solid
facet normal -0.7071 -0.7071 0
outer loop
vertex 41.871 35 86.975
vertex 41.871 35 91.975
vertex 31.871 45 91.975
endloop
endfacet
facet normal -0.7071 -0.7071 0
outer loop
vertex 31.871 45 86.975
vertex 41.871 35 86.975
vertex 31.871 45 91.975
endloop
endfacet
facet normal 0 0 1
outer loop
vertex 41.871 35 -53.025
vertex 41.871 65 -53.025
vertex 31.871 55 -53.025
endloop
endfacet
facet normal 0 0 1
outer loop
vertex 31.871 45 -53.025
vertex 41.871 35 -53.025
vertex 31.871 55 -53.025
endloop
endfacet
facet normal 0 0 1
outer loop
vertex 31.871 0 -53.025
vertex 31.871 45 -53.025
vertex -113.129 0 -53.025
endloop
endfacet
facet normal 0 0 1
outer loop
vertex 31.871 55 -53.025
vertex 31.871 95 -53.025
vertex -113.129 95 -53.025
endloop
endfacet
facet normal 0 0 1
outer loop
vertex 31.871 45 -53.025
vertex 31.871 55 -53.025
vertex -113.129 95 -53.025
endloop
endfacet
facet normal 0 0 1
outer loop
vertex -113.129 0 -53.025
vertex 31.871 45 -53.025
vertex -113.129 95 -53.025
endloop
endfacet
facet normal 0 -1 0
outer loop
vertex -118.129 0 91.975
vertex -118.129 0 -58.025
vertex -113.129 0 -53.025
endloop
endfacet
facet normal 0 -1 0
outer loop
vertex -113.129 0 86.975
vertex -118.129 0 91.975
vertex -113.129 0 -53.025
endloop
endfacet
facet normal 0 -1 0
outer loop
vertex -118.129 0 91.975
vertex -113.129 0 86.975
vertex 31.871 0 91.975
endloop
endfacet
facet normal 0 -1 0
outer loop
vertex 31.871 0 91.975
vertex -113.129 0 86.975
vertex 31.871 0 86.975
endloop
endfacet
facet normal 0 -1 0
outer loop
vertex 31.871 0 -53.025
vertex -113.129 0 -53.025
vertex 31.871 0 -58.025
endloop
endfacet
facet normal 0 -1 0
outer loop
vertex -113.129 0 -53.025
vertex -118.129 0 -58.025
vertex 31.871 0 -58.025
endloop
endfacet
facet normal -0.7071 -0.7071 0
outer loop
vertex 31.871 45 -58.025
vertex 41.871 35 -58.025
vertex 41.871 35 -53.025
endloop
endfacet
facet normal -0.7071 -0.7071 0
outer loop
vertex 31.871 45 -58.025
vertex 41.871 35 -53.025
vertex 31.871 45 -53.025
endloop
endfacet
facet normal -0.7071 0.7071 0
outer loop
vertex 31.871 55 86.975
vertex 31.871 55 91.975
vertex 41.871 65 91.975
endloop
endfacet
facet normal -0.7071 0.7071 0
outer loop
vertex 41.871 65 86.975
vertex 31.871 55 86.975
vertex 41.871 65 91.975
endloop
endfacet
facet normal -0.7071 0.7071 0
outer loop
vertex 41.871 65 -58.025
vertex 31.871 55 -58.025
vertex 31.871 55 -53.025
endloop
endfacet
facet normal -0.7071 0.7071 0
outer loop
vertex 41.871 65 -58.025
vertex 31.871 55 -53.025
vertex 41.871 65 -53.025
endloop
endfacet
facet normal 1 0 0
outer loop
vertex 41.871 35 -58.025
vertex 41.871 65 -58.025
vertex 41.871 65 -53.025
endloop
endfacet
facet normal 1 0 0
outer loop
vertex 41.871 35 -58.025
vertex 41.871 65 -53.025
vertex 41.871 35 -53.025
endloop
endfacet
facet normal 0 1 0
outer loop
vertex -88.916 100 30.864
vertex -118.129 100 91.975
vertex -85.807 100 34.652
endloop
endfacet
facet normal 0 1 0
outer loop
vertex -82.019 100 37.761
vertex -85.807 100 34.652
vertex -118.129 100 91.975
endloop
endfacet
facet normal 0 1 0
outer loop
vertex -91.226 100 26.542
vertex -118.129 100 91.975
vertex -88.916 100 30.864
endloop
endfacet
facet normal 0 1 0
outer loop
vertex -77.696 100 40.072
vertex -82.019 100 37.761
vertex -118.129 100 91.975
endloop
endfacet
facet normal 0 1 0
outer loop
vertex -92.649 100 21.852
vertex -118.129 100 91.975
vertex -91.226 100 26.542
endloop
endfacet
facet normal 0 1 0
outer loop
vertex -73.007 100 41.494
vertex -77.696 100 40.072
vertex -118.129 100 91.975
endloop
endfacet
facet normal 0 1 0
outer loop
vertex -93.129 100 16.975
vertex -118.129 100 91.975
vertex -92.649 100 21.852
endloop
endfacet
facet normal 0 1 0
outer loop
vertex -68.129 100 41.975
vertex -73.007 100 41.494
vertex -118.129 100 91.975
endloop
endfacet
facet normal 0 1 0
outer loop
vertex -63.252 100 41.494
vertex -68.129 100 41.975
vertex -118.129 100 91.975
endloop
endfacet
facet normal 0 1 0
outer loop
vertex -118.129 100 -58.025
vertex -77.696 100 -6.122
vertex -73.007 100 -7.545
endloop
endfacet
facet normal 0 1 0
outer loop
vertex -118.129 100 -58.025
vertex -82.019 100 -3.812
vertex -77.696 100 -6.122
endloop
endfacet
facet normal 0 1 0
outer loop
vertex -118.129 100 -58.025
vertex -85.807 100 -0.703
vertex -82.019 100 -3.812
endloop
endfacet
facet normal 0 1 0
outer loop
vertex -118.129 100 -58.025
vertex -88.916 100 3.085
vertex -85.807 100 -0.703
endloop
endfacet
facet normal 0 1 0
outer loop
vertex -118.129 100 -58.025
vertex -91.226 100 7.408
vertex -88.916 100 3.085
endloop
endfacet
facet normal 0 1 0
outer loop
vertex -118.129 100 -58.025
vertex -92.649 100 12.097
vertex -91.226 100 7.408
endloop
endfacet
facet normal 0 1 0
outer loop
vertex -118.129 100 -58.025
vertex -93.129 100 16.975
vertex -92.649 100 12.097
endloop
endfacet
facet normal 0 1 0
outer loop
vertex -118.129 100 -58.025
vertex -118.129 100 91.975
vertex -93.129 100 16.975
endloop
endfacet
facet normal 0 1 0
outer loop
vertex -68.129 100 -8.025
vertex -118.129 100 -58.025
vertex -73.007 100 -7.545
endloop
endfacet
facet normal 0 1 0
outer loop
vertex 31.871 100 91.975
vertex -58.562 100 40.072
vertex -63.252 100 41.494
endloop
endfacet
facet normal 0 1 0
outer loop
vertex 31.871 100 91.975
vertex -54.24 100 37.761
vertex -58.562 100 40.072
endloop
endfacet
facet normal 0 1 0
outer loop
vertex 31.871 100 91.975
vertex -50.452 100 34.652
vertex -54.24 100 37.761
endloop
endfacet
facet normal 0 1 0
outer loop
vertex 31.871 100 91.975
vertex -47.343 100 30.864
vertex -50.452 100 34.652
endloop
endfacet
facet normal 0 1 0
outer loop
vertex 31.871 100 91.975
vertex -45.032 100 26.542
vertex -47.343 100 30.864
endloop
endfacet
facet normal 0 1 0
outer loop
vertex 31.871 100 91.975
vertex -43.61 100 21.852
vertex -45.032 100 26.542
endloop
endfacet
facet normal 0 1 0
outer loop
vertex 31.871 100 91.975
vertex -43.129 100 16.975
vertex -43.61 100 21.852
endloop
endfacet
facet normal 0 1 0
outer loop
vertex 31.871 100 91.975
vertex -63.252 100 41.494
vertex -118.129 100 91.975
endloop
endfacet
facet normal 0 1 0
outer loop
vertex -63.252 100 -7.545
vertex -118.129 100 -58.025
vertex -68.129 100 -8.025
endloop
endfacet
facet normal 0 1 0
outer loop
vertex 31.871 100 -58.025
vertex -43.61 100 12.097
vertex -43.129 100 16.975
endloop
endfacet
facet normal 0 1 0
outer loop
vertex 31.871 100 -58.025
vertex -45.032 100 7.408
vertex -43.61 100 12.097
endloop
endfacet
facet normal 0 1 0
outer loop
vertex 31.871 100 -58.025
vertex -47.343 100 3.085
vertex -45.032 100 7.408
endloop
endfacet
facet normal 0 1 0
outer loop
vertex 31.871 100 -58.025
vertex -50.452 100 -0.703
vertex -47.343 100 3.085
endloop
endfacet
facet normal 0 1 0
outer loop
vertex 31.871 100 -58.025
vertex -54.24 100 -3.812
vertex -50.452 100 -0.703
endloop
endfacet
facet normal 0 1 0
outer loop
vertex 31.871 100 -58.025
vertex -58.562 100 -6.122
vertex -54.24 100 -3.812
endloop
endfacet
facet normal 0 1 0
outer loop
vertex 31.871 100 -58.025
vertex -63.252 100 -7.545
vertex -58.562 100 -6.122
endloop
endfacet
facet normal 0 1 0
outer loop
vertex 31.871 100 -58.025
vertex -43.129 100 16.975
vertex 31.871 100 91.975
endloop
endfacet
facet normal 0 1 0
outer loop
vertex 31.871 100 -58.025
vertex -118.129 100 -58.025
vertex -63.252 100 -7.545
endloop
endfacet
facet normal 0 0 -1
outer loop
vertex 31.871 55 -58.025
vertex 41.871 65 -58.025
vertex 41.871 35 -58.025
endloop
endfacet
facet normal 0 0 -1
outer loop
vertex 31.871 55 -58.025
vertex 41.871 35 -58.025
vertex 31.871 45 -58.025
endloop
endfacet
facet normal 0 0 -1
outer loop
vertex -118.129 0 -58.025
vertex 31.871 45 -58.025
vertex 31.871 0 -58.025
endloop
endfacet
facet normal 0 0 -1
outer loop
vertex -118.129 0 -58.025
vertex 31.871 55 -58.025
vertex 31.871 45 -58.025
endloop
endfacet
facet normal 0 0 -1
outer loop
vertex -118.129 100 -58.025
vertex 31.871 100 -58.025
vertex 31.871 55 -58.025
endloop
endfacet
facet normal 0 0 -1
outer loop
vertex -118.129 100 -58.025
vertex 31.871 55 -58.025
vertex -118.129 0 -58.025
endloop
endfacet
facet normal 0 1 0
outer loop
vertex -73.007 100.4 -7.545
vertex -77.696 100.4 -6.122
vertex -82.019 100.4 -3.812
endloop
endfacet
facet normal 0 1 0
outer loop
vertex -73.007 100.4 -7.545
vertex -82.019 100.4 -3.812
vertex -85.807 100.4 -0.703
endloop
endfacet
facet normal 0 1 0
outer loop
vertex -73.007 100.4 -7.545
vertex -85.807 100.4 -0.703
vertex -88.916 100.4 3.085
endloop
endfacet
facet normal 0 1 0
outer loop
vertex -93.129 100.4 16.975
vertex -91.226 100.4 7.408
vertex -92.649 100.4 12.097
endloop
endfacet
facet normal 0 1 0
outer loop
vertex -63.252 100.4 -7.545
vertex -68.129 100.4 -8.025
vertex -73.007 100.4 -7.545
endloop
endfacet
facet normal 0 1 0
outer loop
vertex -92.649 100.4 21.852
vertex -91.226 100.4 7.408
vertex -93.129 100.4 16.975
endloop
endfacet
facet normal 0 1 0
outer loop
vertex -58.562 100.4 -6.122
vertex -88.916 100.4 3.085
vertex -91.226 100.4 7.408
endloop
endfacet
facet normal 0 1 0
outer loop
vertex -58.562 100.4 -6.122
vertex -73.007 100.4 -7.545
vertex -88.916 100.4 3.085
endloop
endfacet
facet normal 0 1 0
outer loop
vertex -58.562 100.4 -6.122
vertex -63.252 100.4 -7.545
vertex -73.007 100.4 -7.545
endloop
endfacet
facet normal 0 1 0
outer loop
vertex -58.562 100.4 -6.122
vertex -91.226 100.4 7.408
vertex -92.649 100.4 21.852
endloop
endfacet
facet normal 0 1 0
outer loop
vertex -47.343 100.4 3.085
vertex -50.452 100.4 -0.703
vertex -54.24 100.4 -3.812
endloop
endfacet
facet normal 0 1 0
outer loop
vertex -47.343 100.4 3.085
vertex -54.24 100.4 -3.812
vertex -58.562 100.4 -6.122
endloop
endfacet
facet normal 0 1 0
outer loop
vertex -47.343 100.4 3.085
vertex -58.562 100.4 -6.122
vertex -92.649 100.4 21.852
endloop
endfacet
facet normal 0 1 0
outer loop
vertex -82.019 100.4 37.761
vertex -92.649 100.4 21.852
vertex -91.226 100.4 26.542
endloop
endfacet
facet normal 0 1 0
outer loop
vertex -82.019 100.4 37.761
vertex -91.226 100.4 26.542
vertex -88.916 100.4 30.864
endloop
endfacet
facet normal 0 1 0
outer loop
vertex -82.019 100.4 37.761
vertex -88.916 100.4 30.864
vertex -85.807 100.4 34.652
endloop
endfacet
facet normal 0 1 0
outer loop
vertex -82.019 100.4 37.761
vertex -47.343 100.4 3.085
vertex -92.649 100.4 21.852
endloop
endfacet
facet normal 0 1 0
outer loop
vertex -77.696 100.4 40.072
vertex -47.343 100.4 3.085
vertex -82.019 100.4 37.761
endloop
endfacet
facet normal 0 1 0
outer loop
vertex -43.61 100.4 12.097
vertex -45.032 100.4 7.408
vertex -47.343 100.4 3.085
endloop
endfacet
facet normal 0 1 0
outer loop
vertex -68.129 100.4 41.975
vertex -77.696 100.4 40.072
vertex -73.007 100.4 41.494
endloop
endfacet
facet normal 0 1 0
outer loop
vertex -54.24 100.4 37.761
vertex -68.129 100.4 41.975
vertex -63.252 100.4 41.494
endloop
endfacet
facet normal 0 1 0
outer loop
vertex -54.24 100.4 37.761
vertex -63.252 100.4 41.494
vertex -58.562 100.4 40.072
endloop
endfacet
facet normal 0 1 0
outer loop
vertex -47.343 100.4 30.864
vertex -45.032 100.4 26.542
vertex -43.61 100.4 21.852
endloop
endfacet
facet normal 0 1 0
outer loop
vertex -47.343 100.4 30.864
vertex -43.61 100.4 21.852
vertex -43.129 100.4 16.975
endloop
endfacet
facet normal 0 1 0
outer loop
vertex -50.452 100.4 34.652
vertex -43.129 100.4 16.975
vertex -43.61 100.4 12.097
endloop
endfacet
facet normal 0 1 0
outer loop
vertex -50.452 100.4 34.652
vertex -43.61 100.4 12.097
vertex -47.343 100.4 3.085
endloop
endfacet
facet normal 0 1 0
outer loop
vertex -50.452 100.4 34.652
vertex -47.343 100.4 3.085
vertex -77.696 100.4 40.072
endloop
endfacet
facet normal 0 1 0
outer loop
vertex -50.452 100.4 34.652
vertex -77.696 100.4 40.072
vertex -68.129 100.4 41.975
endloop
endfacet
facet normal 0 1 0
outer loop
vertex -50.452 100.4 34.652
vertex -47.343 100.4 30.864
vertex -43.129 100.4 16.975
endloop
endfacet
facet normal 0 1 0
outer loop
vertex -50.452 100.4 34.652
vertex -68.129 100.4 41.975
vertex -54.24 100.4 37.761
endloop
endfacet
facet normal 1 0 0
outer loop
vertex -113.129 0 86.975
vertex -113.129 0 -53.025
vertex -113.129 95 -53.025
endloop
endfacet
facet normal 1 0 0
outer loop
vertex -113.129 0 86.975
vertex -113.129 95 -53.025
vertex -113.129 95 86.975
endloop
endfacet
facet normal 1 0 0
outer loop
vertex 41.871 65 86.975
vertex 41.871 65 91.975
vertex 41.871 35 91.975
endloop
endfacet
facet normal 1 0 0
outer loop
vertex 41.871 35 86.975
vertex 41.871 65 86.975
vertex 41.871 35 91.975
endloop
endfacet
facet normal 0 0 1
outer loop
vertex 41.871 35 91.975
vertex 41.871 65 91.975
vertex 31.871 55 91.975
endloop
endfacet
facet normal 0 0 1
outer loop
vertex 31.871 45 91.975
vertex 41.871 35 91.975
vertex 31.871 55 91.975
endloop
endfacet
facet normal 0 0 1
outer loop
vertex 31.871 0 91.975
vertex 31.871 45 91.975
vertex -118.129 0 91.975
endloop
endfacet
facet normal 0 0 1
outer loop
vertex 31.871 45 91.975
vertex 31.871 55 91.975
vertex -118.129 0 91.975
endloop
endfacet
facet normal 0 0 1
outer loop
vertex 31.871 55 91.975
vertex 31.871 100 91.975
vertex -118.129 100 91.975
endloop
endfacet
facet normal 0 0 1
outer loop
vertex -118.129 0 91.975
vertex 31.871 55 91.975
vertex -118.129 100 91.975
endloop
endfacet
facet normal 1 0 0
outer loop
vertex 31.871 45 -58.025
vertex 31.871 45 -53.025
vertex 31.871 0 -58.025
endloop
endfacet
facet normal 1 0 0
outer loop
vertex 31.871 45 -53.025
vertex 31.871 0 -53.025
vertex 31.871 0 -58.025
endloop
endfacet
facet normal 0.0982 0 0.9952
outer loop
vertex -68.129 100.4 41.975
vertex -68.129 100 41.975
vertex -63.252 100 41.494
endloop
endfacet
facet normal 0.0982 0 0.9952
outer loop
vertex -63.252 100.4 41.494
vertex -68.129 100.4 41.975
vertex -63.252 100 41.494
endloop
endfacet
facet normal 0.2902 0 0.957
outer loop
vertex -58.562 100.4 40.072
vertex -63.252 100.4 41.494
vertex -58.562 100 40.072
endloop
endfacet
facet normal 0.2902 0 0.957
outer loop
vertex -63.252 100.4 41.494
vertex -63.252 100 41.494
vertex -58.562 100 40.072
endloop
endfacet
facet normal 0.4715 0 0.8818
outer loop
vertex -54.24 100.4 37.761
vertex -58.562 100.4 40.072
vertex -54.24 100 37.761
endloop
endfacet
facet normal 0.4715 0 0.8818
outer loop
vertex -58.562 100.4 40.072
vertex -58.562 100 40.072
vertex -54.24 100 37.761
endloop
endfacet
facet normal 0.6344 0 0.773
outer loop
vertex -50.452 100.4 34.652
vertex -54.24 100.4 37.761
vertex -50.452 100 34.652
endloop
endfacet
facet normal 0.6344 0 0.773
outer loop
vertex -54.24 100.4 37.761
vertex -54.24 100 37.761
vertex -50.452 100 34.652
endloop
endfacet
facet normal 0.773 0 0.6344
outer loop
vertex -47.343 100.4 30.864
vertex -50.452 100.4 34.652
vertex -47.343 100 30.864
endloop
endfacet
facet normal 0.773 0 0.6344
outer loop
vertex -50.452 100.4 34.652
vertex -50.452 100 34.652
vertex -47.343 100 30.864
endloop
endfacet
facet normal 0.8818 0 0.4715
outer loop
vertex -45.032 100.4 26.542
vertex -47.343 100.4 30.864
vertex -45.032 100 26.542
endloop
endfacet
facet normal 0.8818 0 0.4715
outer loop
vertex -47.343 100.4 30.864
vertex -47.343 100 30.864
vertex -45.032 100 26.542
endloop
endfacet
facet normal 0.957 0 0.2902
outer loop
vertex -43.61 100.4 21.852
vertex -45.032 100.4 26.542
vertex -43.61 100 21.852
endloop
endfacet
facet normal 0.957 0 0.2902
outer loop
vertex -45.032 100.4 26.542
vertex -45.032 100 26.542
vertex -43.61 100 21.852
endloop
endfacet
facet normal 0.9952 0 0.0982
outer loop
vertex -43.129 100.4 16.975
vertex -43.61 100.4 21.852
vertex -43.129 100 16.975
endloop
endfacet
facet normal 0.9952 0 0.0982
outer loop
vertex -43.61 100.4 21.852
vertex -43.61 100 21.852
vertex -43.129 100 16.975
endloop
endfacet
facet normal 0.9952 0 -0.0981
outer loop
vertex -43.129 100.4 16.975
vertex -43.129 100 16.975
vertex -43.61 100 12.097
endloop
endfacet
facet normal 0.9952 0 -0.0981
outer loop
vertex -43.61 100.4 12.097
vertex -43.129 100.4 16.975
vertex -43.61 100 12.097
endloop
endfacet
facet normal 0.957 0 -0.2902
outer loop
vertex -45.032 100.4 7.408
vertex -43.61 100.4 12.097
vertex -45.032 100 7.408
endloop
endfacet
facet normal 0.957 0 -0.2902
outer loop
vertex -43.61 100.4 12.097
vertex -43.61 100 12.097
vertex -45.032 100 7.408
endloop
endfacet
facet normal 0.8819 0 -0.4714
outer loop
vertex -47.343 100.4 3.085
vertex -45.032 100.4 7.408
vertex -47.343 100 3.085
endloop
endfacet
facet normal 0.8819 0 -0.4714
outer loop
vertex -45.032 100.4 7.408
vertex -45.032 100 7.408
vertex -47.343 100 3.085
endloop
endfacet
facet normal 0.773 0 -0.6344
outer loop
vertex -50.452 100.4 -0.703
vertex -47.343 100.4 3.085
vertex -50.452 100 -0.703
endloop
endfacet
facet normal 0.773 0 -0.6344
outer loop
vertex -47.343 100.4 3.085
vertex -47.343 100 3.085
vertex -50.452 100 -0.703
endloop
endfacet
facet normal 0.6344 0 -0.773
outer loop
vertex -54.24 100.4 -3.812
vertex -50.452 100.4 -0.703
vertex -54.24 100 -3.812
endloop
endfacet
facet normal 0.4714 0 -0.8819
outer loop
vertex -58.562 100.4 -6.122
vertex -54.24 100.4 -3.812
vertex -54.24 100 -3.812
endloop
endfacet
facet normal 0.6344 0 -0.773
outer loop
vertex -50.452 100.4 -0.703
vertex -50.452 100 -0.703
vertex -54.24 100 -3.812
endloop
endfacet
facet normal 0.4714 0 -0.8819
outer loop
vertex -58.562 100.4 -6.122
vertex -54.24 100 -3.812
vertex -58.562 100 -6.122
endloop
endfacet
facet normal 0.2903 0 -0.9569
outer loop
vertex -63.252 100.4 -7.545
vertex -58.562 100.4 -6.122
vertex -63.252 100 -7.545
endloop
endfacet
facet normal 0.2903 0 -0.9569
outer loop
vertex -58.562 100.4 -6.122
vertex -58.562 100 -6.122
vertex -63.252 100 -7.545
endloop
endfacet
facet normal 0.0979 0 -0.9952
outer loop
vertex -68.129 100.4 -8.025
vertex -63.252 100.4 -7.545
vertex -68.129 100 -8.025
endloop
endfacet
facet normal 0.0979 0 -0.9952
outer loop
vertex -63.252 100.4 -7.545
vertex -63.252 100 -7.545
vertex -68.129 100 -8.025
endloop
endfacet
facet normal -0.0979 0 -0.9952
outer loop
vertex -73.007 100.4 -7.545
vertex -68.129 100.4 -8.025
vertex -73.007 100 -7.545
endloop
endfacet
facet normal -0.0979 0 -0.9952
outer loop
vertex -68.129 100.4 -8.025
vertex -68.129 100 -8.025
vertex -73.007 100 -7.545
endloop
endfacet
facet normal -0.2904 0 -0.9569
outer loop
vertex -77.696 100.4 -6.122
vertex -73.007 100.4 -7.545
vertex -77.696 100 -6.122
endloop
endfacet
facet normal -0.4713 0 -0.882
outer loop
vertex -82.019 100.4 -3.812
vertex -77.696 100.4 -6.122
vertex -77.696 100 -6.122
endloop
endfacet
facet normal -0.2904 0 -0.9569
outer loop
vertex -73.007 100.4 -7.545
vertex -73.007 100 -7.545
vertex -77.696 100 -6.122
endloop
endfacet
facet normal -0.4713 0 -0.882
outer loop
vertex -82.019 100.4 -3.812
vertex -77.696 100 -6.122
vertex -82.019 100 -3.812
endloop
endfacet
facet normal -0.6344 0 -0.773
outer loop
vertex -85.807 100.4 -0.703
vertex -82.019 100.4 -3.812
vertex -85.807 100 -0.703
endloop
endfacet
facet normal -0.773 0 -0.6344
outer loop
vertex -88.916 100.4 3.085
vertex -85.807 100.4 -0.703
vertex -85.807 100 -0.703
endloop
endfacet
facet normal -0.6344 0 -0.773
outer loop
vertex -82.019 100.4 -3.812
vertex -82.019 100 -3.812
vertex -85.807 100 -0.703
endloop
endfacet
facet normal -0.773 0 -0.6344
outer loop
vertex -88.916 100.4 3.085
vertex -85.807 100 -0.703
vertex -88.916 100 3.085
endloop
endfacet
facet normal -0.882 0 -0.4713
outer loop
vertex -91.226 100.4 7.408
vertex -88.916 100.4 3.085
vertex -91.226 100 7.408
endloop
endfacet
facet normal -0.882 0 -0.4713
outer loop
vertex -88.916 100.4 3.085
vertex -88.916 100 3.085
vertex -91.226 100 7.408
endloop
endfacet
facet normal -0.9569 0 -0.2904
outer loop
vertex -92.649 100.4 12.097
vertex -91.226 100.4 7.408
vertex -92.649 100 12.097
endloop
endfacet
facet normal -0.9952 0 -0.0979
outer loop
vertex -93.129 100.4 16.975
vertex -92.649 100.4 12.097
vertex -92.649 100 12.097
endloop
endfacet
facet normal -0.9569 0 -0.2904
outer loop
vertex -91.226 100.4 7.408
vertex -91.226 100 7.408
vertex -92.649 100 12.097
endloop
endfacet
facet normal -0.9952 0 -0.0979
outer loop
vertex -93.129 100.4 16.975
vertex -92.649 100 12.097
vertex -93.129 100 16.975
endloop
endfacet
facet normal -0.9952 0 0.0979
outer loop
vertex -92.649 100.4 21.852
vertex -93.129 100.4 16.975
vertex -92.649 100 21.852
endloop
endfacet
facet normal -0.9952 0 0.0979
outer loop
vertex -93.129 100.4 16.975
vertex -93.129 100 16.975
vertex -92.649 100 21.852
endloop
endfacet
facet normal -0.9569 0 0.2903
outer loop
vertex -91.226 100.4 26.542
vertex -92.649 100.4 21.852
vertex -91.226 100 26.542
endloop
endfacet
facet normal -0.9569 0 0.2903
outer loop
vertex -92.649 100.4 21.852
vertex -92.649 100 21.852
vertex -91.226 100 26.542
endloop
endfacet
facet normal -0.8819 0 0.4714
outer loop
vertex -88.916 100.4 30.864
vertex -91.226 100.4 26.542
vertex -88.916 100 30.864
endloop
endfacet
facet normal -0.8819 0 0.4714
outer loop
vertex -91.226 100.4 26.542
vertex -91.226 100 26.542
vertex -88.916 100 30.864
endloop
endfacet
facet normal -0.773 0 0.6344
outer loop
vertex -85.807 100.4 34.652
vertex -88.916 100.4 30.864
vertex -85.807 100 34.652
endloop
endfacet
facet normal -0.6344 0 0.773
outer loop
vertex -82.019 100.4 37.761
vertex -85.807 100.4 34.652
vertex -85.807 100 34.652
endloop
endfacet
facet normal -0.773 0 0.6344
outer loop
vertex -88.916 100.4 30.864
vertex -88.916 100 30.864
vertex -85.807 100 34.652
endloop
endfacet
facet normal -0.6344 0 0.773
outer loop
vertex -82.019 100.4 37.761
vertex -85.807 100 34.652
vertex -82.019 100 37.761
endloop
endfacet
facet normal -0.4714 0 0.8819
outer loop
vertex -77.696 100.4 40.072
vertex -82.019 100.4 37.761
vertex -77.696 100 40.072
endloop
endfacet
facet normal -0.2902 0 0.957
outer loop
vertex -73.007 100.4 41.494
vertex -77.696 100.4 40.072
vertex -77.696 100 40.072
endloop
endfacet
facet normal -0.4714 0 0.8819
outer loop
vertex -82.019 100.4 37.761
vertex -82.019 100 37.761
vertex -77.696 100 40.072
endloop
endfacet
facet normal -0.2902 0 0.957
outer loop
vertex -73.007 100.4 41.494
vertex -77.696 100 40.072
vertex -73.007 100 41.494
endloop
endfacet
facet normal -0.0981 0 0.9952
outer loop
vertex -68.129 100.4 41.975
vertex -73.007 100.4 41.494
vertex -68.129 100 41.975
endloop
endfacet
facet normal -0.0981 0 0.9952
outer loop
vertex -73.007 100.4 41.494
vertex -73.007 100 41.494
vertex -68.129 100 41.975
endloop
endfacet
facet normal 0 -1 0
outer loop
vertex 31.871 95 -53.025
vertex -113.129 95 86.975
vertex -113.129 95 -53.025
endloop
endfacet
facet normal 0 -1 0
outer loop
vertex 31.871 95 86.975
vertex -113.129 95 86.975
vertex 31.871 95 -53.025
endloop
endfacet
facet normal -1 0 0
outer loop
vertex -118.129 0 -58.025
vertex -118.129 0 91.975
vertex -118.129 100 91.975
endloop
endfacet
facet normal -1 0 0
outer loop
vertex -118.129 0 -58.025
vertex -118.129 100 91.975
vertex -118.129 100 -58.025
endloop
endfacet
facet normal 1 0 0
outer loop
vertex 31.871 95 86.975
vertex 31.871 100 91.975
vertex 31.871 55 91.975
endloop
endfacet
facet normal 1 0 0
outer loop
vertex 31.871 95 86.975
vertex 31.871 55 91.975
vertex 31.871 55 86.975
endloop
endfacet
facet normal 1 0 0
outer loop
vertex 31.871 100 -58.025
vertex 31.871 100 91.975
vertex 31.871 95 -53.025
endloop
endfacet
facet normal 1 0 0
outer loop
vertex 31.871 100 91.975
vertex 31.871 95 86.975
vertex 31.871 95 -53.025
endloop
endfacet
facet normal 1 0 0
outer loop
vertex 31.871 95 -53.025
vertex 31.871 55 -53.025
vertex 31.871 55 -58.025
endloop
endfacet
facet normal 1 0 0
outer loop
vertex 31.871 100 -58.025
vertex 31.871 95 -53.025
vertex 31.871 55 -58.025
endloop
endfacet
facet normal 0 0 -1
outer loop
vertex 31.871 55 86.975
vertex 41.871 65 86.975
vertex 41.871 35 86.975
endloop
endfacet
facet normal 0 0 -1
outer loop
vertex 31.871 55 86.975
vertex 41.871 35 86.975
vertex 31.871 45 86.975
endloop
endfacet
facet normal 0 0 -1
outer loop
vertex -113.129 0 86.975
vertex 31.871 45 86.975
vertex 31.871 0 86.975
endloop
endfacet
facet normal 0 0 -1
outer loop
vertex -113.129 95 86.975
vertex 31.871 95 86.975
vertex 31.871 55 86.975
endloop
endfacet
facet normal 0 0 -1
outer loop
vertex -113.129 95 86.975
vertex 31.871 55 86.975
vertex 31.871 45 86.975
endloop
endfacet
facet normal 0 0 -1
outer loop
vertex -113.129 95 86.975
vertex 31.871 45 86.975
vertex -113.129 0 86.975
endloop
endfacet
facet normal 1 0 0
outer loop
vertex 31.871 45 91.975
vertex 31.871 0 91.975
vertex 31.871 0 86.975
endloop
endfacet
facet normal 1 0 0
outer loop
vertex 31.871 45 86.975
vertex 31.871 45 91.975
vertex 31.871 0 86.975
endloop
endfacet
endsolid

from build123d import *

# Parameters (mm, degrees)
SKETCH_1_W          = 150
SKETCH_1_H          = 150
EXTRUDE_1_DEPTH     = 100
SKETCH_4_R          = 25
EXTRUDE_2_DEPTH     = 0.4
SKETCH_5_W          = 145
SKETCH_5_H          = 140
CUT_EXTRUDE_1_DEPTH = 95
SKETCH_7_W          = 10
SKETCH_7_H          = 10
EXTRUDE_3_DEPTH     = 5
EXTRUDE_4_DEPTH     = 5
SKETCH_10_W         = 10
SKETCH_10_H         = 10
EXTRUDE_5_DEPTH     = 5
EXTRUDE_6_DEPTH     = 5


with BuildPart() as part:
    # 草图1 → 凸台-拉伸1 (new body)
    with BuildSketch(Plane(origin=(0, 0, 0), x_dir=(1, 0, 0), z_dir=(0, 1, 0))):
        with Locations((-43.129330254, -16.974595843)):
            Rectangle(SKETCH_1_W, SKETCH_1_H)
    extrude(amount=EXTRUDE_1_DEPTH)

    # 草图4 → 凸台-拉伸2 (add)
    with BuildSketch(Plane(origin=(0, 100, 0), x_dir=(1, 0, 0), z_dir=(0, 1, 0))):
        with Locations(Location((-68.129330254, -16.974595843, 0), (0, 0, 270))):
            Circle(SKETCH_4_R)
    extrude(amount=EXTRUDE_2_DEPTH)

    # 草图5 → 切除-拉伸1 (cut)
    with BuildSketch(Plane.XZ):
        with Locations((-40.629330254, 16.974595843)):
            Rectangle(SKETCH_5_W, SKETCH_5_H)
    extrude(amount=-CUT_EXTRUDE_1_DEPTH, mode=Mode.SUBTRACT)

    # 草图7 → 凸台-拉伸3 (add)
    with BuildSketch(Plane.XY.offset(91.974595843)):
        with Locations((36.870669746, 50)):
            Rectangle(SKETCH_7_W, SKETCH_7_H)
    extrude(amount=-EXTRUDE_3_DEPTH)

    # 草图9 → 凸台-拉伸4 (add)
    with BuildSketch(Plane.XY.offset(91.974595843)):
        Polygon((31.870669746, 55), (41.870669746, 65), (41.870669746, 55), align=None)
        Polygon((31.870669746, 45), (41.870669746, 45), (41.870669746, 35), align=None)
    extrude(amount=-EXTRUDE_4_DEPTH)

    # 草图10 → 凸台-拉伸5 (add)
    with BuildSketch(Plane(origin=(0, 0, -58.025404157), x_dir=(-1, 0, 0), z_dir=(0, 0, -1))):
        with Locations((-36.870669746, 50)):
            Rectangle(SKETCH_10_W, SKETCH_10_H)
    extrude(amount=-EXTRUDE_5_DEPTH)

    # 草图11 → 凸台-拉伸6 (add)
    with BuildSketch(Plane(origin=(0, 0, -58.025404157), x_dir=(-1, 0, 0), z_dir=(0, 0, -1))):
        Polygon((-31.870669746, 55), (-41.870669746, 65), (-41.870669746, 55), align=None)
        Polygon((-31.870669746, 45), (-41.870669746, 45), (-41.870669746, 35), align=None)
    extrude(amount=-EXTRUDE_6_DEPTH)


solid = part.part
